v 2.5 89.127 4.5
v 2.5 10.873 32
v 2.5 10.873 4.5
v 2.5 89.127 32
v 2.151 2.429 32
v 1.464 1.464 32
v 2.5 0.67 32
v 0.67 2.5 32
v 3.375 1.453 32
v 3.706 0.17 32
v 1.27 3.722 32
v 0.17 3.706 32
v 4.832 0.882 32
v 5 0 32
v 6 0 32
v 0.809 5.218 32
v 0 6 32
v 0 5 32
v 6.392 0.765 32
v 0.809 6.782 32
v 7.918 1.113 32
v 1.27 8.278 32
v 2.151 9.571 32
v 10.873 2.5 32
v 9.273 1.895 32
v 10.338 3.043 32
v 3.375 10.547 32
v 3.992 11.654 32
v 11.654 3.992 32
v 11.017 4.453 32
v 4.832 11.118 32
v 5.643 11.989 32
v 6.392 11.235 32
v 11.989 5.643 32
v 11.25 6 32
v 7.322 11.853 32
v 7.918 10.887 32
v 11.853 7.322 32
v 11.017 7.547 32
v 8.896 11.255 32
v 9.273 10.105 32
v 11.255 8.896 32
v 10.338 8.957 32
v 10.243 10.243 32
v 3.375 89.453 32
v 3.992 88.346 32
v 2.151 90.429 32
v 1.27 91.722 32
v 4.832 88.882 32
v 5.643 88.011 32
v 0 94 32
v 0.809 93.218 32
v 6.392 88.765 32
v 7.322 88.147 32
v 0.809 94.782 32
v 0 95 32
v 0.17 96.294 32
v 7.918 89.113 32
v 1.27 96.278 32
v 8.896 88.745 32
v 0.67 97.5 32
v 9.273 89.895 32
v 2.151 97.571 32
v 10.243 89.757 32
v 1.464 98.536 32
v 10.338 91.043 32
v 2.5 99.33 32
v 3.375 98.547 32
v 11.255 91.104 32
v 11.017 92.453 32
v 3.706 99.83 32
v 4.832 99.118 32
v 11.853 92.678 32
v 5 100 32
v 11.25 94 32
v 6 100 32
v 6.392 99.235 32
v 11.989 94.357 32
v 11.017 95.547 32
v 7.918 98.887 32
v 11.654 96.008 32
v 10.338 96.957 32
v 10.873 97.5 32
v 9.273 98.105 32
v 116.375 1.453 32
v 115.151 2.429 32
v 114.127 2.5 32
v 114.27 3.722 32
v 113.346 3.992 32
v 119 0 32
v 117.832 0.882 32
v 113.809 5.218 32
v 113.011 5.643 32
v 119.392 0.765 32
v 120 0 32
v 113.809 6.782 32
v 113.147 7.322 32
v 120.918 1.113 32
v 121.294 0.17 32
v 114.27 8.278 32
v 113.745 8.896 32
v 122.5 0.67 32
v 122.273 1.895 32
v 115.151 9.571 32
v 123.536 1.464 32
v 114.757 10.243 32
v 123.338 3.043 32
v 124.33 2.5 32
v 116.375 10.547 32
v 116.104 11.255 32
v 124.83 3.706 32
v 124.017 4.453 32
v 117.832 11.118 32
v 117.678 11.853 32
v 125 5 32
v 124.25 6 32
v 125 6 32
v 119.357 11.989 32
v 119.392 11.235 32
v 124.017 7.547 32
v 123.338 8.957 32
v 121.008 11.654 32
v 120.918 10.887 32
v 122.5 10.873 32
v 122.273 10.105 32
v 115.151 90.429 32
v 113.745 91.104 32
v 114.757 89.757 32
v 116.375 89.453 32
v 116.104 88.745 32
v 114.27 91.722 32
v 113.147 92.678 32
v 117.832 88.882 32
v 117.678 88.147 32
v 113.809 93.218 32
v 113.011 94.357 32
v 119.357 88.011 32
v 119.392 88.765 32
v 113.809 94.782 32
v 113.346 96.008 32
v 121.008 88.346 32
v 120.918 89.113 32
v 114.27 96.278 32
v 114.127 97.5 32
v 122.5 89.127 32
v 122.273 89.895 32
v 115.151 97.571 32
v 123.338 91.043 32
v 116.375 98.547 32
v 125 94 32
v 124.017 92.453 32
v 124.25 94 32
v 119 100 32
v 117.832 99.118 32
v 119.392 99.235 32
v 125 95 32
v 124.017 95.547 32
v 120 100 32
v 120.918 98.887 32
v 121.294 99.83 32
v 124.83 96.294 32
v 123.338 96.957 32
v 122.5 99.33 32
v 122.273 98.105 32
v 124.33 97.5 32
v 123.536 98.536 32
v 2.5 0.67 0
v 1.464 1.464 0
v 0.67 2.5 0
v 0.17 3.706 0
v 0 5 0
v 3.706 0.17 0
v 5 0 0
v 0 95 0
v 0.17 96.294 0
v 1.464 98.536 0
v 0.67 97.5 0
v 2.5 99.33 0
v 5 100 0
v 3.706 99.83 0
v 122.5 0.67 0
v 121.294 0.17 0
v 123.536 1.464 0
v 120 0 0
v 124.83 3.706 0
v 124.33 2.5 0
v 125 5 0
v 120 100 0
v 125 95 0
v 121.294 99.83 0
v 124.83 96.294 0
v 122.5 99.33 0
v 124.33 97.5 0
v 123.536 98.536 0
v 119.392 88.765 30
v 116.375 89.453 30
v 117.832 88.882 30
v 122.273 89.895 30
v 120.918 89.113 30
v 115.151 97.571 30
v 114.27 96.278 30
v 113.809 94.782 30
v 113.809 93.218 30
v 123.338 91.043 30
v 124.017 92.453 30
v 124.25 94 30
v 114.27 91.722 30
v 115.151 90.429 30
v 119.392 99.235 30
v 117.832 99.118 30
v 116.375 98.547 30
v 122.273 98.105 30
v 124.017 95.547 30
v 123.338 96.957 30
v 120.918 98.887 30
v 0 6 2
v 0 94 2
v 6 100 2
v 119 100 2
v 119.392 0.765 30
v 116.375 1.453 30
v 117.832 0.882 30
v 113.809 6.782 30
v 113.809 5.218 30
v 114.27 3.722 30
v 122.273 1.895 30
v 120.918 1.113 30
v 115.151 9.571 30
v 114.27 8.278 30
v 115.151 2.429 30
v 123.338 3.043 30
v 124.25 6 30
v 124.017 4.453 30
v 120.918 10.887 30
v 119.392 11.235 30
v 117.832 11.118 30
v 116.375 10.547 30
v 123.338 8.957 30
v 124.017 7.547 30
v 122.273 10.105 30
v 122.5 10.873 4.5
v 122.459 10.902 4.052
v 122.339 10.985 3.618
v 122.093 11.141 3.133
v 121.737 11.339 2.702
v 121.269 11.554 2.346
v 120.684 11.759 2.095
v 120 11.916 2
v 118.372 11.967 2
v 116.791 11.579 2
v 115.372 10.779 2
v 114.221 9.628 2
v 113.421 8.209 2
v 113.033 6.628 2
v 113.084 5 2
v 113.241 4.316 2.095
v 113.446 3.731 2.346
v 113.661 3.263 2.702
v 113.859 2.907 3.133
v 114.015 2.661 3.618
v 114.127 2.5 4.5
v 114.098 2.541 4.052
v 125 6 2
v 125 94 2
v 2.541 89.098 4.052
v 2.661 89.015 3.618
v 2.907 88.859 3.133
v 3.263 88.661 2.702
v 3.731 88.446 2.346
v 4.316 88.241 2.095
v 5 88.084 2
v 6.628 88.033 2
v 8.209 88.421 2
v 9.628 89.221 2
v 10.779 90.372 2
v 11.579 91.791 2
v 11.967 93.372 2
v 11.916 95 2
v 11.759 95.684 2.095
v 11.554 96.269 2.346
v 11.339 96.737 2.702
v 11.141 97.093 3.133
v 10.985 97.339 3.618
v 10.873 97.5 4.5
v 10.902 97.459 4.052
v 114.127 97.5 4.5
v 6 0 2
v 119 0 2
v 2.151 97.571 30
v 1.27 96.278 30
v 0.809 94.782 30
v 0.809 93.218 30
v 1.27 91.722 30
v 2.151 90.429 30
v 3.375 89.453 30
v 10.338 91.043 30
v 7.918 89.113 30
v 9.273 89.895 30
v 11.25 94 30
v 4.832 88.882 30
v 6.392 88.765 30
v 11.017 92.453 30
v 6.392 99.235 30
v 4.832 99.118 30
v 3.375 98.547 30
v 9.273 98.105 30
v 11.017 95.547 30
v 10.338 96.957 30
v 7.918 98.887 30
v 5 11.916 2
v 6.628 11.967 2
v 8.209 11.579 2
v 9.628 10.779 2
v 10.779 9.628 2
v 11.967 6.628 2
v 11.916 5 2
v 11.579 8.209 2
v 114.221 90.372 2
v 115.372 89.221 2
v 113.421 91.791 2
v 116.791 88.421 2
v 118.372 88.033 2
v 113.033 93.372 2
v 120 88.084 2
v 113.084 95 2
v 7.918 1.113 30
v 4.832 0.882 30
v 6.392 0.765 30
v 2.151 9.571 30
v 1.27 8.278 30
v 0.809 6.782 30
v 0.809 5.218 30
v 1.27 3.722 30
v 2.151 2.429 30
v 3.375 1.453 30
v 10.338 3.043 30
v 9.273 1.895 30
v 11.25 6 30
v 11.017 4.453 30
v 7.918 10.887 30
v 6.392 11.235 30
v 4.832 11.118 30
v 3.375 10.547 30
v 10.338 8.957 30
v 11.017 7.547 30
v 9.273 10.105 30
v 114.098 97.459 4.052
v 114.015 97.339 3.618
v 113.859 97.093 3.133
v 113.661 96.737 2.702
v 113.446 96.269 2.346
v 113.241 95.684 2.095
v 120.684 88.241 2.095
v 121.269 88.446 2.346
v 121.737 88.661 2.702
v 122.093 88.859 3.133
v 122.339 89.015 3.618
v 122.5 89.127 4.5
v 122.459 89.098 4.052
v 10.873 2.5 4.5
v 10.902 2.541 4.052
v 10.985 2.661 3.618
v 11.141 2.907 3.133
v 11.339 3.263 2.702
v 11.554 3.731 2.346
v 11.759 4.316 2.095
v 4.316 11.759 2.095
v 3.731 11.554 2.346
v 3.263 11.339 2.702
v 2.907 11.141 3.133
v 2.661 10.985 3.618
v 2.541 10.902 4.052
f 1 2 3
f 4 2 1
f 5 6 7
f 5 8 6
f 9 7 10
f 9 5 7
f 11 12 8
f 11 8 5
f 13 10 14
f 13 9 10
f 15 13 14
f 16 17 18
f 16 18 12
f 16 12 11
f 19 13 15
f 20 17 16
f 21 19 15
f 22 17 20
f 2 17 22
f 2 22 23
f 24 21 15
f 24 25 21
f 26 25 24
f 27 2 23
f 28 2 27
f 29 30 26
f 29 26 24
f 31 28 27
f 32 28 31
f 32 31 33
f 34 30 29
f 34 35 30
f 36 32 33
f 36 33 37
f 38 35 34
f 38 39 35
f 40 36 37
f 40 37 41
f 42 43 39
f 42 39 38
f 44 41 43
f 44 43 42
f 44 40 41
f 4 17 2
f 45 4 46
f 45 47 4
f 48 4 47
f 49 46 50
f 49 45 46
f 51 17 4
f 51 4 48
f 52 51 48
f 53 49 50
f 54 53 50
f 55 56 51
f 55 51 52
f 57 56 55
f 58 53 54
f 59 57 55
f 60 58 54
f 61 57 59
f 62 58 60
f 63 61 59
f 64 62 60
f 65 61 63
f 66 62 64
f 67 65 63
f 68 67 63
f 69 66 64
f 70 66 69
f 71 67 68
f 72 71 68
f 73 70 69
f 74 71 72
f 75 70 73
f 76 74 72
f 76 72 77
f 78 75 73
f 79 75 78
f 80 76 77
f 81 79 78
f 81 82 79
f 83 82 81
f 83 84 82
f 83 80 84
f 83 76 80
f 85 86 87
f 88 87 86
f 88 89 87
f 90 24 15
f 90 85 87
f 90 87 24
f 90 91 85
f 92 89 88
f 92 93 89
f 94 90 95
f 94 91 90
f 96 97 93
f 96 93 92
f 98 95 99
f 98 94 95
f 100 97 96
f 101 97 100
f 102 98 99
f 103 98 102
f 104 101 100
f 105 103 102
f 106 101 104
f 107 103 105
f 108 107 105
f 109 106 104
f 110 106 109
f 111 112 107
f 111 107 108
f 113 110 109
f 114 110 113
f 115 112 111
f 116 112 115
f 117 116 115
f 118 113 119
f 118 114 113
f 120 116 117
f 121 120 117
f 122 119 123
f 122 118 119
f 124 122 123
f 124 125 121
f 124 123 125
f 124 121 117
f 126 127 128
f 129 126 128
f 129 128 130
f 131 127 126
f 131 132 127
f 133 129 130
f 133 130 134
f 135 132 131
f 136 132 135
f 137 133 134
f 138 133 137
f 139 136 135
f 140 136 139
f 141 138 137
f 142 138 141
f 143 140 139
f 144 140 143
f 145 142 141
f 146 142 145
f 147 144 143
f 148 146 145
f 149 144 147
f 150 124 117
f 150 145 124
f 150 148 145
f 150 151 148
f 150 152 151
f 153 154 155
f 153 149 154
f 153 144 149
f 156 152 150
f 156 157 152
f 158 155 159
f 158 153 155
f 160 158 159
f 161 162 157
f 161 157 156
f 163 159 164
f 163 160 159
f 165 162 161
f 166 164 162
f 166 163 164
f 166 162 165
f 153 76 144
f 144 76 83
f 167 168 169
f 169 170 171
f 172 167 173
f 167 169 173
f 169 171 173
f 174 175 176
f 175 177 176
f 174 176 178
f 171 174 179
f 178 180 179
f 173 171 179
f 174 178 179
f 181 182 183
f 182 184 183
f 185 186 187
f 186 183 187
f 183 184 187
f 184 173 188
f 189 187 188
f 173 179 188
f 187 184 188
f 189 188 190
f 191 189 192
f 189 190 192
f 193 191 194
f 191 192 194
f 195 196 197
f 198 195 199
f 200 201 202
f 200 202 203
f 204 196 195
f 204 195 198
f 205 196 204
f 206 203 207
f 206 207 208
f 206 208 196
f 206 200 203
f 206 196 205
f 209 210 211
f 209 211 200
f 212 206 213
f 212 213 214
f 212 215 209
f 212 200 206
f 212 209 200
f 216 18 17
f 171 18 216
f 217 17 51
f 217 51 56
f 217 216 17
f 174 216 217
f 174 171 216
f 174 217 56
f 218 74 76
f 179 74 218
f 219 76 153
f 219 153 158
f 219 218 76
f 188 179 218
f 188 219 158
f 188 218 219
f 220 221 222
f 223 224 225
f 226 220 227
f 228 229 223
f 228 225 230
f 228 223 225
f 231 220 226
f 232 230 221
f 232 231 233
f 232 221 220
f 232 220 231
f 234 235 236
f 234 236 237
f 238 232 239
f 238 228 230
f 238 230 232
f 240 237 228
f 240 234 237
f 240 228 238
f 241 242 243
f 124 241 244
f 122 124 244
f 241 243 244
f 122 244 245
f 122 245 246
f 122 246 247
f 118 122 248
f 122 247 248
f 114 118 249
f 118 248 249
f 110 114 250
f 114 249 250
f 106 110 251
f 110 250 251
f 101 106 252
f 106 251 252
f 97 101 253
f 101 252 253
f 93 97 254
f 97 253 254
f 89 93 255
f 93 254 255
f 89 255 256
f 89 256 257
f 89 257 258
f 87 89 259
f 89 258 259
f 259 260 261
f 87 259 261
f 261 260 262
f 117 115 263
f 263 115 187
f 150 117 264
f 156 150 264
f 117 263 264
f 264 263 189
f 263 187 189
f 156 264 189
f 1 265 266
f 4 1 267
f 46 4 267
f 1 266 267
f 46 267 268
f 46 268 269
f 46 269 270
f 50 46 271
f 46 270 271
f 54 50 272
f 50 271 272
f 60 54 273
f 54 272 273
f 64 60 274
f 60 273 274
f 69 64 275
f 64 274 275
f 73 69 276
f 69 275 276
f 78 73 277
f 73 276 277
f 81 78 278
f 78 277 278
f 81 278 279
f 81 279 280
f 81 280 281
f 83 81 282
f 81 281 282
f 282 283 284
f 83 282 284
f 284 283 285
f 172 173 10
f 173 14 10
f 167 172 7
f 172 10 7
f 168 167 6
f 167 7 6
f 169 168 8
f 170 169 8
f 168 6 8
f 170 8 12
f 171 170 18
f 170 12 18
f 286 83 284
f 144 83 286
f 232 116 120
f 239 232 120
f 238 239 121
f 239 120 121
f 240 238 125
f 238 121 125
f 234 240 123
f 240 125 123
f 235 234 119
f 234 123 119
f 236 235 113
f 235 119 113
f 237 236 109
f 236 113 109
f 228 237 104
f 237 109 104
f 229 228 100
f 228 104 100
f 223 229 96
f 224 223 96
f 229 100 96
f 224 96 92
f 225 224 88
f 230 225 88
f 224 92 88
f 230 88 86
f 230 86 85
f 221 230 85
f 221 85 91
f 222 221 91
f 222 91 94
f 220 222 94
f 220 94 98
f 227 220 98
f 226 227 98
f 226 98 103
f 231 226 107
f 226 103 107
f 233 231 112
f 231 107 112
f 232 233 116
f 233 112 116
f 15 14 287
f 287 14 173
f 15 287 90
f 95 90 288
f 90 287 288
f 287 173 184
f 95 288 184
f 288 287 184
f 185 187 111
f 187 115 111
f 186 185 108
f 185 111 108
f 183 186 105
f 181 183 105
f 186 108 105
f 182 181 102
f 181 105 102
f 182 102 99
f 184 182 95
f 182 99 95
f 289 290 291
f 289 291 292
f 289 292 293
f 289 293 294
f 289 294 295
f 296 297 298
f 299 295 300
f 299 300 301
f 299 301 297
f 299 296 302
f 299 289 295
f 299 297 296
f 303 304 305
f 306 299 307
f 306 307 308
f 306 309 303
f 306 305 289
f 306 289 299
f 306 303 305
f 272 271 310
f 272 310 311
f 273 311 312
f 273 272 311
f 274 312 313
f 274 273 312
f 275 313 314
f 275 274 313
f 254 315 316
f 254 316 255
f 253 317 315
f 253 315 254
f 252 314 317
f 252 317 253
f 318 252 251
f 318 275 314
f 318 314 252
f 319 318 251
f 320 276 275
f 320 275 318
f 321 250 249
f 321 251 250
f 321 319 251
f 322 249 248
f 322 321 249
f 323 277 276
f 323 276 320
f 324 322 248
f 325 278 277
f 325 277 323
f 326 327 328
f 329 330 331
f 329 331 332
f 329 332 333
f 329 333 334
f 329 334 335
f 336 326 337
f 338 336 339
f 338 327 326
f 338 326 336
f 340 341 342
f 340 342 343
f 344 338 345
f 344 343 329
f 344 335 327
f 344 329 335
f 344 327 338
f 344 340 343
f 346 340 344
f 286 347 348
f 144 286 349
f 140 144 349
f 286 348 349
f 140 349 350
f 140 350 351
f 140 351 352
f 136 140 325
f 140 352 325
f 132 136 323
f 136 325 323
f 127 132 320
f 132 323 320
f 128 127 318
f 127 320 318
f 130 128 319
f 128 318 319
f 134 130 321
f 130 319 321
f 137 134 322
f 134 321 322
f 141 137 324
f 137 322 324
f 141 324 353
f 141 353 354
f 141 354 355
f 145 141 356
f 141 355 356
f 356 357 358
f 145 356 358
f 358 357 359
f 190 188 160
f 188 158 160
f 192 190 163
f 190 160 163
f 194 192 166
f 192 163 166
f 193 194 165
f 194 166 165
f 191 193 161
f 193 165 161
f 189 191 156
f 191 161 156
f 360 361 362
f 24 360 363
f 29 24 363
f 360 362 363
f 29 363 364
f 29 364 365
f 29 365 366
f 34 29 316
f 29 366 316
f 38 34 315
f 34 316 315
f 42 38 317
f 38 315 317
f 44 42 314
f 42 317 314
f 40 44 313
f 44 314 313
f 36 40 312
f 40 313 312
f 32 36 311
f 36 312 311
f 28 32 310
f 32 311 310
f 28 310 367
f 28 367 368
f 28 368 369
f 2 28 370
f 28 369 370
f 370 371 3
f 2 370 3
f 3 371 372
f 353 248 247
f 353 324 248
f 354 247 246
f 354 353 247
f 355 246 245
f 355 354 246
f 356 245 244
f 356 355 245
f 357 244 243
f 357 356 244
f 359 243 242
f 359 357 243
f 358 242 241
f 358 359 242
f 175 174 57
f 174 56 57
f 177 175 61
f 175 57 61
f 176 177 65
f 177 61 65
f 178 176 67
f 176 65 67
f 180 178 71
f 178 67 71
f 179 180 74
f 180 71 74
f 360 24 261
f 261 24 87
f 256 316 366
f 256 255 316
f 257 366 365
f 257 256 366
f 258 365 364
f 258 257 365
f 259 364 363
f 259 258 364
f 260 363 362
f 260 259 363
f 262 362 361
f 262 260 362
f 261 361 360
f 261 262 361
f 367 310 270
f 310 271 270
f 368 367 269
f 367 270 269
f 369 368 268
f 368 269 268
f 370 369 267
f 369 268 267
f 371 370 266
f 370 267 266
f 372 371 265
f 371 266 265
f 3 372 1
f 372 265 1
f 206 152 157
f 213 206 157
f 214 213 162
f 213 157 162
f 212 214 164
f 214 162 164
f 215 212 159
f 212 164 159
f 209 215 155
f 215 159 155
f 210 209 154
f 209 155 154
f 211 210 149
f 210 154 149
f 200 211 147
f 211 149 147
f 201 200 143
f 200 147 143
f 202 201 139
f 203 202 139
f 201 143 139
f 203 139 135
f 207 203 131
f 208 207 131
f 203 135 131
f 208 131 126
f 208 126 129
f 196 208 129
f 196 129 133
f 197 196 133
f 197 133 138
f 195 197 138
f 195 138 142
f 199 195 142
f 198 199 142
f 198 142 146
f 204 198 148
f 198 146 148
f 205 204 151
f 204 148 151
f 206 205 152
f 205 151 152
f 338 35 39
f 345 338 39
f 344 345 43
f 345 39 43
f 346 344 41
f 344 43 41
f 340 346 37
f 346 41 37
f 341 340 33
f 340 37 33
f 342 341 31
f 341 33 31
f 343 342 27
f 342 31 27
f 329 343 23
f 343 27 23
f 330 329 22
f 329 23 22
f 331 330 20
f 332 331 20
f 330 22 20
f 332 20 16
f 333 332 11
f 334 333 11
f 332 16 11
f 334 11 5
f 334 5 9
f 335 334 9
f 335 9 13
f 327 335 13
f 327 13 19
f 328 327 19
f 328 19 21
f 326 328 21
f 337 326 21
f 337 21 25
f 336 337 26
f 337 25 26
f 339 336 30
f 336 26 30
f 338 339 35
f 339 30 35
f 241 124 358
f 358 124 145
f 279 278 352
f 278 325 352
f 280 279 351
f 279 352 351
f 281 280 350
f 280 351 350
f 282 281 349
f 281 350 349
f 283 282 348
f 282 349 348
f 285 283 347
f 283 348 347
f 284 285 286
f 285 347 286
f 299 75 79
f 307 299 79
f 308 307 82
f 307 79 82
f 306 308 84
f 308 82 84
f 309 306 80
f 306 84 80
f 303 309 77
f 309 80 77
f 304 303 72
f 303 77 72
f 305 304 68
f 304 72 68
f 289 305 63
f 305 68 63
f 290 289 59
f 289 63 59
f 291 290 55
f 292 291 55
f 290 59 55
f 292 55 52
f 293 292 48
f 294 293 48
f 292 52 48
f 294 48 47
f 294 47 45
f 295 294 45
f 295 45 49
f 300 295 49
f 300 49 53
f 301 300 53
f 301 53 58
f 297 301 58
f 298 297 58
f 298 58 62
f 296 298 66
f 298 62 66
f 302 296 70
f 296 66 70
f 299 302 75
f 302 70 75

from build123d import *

# Parameters (mm, degrees)
SKETCH_W        = 125
SKETCH_H        = 100
PAD_DEPTH       = 32
SKETCH001_W     = 120
SKETCH001_H     = 95
POCKET_DEPTH    = 32
SKETCH002_R     = 6
PAD001_DEPTH    = 30
SKETCH003_R     = 5.25
POCKET001_DEPTH = 2
FILLET_R        = 2.5
FILLET001_R     = 2.5
FILLET002_R     = 2.5
FILLET003_R     = 2.5
FILLET004_R     = 5
FILLET005_R     = 5
FILLET006_R     = 5
FILLET007_R     = 5


with BuildPart() as part:
    # Sketch → Pad (new body)
    with BuildSketch(Plane.XY):
        with Locations((62.5, 50)):
            Rectangle(SKETCH_W, SKETCH_H)
    extrude(amount=PAD_DEPTH)

    # Sketch001 → Pocket (cut)
    with BuildSketch(Plane.XY.offset(34)):
        with Locations((62.5, 50)):
            Rectangle(SKETCH001_W, SKETCH001_H)
    extrude(amount=-POCKET_DEPTH, mode=Mode.SUBTRACT)

    # Sketch002 (on Face11 of Pocket) → Pad001 (join)
    with BuildSketch(Plane.XY.offset(2)):
        with Locations((6, 6)):
            Circle(SKETCH002_R)
        with Locations((6, 94)):
            Circle(SKETCH002_R)
        with Locations((119, 94)):
            Circle(SKETCH002_R)
        with Locations((119, 6)):
            Circle(SKETCH002_R)
    extrude(amount=PAD001_DEPTH)

    # Sketch003 (on Face27 of Pad001) → Pocket001 (cut)
    with BuildSketch(Plane.XY.offset(32)):
        with Locations((6, 6)):
            Circle(SKETCH003_R)
        with Locations((6, 94)):
            Circle(SKETCH003_R)
        with Locations((119, 94)):
            Circle(SKETCH003_R)
        with Locations((119, 6)):
            Circle(SKETCH003_R)
    extrude(amount=-POCKET001_DEPTH, mode=Mode.SUBTRACT)

    # Fillet
    fillet_edges = [part.edges().sort_by_distance(p)[0] for p in [
        (62.5, 2.5, 2),
    ]]
    fillet(fillet_edges, radius=FILLET_R)

    # Fillet001
    fillet001_edges = [part.edges().sort_by_distance(p)[0] for p in [
        (122.5, 50, 2),
    ]]
    fillet(fillet001_edges, radius=FILLET001_R)

    # Fillet002
    fillet002_edges = [part.edges().sort_by_distance(p)[0] for p in [
        (62.5, 97.5, 2),
    ]]
    fillet(fillet002_edges, radius=FILLET002_R)

    # Fillet003
    fillet003_edges = [part.edges().sort_by_distance(p)[0] for p in [
        (2.5, 50, 2),
    ]]
    fillet(fillet003_edges, radius=FILLET003_R)

    # Fillet004
    fillet004_edges = [part.edges().sort_by_distance(p)[0] for p in [
        (125, 100, 16),
    ]]
    fillet(fillet004_edges, radius=FILLET004_R)

    # Fillet005
    fillet005_edges = [part.edges().sort_by_distance(p)[0] for p in [
        (125, 0, 16),
    ]]
    fillet(fillet005_edges, radius=FILLET005_R)

    # Fillet006
    fillet006_edges = [part.edges().sort_by_distance(p)[0] for p in [
        (0, 0, 16),
    ]]
    fillet(fillet006_edges, radius=FILLET006_R)

    # Fillet007
    fillet007_edges = [part.edges().sort_by_distance(p)[0] for p in [
        (0, 100, 16),
    ]]
    fillet(fillet007_edges, radius=FILLET007_R)


solid = part.part
